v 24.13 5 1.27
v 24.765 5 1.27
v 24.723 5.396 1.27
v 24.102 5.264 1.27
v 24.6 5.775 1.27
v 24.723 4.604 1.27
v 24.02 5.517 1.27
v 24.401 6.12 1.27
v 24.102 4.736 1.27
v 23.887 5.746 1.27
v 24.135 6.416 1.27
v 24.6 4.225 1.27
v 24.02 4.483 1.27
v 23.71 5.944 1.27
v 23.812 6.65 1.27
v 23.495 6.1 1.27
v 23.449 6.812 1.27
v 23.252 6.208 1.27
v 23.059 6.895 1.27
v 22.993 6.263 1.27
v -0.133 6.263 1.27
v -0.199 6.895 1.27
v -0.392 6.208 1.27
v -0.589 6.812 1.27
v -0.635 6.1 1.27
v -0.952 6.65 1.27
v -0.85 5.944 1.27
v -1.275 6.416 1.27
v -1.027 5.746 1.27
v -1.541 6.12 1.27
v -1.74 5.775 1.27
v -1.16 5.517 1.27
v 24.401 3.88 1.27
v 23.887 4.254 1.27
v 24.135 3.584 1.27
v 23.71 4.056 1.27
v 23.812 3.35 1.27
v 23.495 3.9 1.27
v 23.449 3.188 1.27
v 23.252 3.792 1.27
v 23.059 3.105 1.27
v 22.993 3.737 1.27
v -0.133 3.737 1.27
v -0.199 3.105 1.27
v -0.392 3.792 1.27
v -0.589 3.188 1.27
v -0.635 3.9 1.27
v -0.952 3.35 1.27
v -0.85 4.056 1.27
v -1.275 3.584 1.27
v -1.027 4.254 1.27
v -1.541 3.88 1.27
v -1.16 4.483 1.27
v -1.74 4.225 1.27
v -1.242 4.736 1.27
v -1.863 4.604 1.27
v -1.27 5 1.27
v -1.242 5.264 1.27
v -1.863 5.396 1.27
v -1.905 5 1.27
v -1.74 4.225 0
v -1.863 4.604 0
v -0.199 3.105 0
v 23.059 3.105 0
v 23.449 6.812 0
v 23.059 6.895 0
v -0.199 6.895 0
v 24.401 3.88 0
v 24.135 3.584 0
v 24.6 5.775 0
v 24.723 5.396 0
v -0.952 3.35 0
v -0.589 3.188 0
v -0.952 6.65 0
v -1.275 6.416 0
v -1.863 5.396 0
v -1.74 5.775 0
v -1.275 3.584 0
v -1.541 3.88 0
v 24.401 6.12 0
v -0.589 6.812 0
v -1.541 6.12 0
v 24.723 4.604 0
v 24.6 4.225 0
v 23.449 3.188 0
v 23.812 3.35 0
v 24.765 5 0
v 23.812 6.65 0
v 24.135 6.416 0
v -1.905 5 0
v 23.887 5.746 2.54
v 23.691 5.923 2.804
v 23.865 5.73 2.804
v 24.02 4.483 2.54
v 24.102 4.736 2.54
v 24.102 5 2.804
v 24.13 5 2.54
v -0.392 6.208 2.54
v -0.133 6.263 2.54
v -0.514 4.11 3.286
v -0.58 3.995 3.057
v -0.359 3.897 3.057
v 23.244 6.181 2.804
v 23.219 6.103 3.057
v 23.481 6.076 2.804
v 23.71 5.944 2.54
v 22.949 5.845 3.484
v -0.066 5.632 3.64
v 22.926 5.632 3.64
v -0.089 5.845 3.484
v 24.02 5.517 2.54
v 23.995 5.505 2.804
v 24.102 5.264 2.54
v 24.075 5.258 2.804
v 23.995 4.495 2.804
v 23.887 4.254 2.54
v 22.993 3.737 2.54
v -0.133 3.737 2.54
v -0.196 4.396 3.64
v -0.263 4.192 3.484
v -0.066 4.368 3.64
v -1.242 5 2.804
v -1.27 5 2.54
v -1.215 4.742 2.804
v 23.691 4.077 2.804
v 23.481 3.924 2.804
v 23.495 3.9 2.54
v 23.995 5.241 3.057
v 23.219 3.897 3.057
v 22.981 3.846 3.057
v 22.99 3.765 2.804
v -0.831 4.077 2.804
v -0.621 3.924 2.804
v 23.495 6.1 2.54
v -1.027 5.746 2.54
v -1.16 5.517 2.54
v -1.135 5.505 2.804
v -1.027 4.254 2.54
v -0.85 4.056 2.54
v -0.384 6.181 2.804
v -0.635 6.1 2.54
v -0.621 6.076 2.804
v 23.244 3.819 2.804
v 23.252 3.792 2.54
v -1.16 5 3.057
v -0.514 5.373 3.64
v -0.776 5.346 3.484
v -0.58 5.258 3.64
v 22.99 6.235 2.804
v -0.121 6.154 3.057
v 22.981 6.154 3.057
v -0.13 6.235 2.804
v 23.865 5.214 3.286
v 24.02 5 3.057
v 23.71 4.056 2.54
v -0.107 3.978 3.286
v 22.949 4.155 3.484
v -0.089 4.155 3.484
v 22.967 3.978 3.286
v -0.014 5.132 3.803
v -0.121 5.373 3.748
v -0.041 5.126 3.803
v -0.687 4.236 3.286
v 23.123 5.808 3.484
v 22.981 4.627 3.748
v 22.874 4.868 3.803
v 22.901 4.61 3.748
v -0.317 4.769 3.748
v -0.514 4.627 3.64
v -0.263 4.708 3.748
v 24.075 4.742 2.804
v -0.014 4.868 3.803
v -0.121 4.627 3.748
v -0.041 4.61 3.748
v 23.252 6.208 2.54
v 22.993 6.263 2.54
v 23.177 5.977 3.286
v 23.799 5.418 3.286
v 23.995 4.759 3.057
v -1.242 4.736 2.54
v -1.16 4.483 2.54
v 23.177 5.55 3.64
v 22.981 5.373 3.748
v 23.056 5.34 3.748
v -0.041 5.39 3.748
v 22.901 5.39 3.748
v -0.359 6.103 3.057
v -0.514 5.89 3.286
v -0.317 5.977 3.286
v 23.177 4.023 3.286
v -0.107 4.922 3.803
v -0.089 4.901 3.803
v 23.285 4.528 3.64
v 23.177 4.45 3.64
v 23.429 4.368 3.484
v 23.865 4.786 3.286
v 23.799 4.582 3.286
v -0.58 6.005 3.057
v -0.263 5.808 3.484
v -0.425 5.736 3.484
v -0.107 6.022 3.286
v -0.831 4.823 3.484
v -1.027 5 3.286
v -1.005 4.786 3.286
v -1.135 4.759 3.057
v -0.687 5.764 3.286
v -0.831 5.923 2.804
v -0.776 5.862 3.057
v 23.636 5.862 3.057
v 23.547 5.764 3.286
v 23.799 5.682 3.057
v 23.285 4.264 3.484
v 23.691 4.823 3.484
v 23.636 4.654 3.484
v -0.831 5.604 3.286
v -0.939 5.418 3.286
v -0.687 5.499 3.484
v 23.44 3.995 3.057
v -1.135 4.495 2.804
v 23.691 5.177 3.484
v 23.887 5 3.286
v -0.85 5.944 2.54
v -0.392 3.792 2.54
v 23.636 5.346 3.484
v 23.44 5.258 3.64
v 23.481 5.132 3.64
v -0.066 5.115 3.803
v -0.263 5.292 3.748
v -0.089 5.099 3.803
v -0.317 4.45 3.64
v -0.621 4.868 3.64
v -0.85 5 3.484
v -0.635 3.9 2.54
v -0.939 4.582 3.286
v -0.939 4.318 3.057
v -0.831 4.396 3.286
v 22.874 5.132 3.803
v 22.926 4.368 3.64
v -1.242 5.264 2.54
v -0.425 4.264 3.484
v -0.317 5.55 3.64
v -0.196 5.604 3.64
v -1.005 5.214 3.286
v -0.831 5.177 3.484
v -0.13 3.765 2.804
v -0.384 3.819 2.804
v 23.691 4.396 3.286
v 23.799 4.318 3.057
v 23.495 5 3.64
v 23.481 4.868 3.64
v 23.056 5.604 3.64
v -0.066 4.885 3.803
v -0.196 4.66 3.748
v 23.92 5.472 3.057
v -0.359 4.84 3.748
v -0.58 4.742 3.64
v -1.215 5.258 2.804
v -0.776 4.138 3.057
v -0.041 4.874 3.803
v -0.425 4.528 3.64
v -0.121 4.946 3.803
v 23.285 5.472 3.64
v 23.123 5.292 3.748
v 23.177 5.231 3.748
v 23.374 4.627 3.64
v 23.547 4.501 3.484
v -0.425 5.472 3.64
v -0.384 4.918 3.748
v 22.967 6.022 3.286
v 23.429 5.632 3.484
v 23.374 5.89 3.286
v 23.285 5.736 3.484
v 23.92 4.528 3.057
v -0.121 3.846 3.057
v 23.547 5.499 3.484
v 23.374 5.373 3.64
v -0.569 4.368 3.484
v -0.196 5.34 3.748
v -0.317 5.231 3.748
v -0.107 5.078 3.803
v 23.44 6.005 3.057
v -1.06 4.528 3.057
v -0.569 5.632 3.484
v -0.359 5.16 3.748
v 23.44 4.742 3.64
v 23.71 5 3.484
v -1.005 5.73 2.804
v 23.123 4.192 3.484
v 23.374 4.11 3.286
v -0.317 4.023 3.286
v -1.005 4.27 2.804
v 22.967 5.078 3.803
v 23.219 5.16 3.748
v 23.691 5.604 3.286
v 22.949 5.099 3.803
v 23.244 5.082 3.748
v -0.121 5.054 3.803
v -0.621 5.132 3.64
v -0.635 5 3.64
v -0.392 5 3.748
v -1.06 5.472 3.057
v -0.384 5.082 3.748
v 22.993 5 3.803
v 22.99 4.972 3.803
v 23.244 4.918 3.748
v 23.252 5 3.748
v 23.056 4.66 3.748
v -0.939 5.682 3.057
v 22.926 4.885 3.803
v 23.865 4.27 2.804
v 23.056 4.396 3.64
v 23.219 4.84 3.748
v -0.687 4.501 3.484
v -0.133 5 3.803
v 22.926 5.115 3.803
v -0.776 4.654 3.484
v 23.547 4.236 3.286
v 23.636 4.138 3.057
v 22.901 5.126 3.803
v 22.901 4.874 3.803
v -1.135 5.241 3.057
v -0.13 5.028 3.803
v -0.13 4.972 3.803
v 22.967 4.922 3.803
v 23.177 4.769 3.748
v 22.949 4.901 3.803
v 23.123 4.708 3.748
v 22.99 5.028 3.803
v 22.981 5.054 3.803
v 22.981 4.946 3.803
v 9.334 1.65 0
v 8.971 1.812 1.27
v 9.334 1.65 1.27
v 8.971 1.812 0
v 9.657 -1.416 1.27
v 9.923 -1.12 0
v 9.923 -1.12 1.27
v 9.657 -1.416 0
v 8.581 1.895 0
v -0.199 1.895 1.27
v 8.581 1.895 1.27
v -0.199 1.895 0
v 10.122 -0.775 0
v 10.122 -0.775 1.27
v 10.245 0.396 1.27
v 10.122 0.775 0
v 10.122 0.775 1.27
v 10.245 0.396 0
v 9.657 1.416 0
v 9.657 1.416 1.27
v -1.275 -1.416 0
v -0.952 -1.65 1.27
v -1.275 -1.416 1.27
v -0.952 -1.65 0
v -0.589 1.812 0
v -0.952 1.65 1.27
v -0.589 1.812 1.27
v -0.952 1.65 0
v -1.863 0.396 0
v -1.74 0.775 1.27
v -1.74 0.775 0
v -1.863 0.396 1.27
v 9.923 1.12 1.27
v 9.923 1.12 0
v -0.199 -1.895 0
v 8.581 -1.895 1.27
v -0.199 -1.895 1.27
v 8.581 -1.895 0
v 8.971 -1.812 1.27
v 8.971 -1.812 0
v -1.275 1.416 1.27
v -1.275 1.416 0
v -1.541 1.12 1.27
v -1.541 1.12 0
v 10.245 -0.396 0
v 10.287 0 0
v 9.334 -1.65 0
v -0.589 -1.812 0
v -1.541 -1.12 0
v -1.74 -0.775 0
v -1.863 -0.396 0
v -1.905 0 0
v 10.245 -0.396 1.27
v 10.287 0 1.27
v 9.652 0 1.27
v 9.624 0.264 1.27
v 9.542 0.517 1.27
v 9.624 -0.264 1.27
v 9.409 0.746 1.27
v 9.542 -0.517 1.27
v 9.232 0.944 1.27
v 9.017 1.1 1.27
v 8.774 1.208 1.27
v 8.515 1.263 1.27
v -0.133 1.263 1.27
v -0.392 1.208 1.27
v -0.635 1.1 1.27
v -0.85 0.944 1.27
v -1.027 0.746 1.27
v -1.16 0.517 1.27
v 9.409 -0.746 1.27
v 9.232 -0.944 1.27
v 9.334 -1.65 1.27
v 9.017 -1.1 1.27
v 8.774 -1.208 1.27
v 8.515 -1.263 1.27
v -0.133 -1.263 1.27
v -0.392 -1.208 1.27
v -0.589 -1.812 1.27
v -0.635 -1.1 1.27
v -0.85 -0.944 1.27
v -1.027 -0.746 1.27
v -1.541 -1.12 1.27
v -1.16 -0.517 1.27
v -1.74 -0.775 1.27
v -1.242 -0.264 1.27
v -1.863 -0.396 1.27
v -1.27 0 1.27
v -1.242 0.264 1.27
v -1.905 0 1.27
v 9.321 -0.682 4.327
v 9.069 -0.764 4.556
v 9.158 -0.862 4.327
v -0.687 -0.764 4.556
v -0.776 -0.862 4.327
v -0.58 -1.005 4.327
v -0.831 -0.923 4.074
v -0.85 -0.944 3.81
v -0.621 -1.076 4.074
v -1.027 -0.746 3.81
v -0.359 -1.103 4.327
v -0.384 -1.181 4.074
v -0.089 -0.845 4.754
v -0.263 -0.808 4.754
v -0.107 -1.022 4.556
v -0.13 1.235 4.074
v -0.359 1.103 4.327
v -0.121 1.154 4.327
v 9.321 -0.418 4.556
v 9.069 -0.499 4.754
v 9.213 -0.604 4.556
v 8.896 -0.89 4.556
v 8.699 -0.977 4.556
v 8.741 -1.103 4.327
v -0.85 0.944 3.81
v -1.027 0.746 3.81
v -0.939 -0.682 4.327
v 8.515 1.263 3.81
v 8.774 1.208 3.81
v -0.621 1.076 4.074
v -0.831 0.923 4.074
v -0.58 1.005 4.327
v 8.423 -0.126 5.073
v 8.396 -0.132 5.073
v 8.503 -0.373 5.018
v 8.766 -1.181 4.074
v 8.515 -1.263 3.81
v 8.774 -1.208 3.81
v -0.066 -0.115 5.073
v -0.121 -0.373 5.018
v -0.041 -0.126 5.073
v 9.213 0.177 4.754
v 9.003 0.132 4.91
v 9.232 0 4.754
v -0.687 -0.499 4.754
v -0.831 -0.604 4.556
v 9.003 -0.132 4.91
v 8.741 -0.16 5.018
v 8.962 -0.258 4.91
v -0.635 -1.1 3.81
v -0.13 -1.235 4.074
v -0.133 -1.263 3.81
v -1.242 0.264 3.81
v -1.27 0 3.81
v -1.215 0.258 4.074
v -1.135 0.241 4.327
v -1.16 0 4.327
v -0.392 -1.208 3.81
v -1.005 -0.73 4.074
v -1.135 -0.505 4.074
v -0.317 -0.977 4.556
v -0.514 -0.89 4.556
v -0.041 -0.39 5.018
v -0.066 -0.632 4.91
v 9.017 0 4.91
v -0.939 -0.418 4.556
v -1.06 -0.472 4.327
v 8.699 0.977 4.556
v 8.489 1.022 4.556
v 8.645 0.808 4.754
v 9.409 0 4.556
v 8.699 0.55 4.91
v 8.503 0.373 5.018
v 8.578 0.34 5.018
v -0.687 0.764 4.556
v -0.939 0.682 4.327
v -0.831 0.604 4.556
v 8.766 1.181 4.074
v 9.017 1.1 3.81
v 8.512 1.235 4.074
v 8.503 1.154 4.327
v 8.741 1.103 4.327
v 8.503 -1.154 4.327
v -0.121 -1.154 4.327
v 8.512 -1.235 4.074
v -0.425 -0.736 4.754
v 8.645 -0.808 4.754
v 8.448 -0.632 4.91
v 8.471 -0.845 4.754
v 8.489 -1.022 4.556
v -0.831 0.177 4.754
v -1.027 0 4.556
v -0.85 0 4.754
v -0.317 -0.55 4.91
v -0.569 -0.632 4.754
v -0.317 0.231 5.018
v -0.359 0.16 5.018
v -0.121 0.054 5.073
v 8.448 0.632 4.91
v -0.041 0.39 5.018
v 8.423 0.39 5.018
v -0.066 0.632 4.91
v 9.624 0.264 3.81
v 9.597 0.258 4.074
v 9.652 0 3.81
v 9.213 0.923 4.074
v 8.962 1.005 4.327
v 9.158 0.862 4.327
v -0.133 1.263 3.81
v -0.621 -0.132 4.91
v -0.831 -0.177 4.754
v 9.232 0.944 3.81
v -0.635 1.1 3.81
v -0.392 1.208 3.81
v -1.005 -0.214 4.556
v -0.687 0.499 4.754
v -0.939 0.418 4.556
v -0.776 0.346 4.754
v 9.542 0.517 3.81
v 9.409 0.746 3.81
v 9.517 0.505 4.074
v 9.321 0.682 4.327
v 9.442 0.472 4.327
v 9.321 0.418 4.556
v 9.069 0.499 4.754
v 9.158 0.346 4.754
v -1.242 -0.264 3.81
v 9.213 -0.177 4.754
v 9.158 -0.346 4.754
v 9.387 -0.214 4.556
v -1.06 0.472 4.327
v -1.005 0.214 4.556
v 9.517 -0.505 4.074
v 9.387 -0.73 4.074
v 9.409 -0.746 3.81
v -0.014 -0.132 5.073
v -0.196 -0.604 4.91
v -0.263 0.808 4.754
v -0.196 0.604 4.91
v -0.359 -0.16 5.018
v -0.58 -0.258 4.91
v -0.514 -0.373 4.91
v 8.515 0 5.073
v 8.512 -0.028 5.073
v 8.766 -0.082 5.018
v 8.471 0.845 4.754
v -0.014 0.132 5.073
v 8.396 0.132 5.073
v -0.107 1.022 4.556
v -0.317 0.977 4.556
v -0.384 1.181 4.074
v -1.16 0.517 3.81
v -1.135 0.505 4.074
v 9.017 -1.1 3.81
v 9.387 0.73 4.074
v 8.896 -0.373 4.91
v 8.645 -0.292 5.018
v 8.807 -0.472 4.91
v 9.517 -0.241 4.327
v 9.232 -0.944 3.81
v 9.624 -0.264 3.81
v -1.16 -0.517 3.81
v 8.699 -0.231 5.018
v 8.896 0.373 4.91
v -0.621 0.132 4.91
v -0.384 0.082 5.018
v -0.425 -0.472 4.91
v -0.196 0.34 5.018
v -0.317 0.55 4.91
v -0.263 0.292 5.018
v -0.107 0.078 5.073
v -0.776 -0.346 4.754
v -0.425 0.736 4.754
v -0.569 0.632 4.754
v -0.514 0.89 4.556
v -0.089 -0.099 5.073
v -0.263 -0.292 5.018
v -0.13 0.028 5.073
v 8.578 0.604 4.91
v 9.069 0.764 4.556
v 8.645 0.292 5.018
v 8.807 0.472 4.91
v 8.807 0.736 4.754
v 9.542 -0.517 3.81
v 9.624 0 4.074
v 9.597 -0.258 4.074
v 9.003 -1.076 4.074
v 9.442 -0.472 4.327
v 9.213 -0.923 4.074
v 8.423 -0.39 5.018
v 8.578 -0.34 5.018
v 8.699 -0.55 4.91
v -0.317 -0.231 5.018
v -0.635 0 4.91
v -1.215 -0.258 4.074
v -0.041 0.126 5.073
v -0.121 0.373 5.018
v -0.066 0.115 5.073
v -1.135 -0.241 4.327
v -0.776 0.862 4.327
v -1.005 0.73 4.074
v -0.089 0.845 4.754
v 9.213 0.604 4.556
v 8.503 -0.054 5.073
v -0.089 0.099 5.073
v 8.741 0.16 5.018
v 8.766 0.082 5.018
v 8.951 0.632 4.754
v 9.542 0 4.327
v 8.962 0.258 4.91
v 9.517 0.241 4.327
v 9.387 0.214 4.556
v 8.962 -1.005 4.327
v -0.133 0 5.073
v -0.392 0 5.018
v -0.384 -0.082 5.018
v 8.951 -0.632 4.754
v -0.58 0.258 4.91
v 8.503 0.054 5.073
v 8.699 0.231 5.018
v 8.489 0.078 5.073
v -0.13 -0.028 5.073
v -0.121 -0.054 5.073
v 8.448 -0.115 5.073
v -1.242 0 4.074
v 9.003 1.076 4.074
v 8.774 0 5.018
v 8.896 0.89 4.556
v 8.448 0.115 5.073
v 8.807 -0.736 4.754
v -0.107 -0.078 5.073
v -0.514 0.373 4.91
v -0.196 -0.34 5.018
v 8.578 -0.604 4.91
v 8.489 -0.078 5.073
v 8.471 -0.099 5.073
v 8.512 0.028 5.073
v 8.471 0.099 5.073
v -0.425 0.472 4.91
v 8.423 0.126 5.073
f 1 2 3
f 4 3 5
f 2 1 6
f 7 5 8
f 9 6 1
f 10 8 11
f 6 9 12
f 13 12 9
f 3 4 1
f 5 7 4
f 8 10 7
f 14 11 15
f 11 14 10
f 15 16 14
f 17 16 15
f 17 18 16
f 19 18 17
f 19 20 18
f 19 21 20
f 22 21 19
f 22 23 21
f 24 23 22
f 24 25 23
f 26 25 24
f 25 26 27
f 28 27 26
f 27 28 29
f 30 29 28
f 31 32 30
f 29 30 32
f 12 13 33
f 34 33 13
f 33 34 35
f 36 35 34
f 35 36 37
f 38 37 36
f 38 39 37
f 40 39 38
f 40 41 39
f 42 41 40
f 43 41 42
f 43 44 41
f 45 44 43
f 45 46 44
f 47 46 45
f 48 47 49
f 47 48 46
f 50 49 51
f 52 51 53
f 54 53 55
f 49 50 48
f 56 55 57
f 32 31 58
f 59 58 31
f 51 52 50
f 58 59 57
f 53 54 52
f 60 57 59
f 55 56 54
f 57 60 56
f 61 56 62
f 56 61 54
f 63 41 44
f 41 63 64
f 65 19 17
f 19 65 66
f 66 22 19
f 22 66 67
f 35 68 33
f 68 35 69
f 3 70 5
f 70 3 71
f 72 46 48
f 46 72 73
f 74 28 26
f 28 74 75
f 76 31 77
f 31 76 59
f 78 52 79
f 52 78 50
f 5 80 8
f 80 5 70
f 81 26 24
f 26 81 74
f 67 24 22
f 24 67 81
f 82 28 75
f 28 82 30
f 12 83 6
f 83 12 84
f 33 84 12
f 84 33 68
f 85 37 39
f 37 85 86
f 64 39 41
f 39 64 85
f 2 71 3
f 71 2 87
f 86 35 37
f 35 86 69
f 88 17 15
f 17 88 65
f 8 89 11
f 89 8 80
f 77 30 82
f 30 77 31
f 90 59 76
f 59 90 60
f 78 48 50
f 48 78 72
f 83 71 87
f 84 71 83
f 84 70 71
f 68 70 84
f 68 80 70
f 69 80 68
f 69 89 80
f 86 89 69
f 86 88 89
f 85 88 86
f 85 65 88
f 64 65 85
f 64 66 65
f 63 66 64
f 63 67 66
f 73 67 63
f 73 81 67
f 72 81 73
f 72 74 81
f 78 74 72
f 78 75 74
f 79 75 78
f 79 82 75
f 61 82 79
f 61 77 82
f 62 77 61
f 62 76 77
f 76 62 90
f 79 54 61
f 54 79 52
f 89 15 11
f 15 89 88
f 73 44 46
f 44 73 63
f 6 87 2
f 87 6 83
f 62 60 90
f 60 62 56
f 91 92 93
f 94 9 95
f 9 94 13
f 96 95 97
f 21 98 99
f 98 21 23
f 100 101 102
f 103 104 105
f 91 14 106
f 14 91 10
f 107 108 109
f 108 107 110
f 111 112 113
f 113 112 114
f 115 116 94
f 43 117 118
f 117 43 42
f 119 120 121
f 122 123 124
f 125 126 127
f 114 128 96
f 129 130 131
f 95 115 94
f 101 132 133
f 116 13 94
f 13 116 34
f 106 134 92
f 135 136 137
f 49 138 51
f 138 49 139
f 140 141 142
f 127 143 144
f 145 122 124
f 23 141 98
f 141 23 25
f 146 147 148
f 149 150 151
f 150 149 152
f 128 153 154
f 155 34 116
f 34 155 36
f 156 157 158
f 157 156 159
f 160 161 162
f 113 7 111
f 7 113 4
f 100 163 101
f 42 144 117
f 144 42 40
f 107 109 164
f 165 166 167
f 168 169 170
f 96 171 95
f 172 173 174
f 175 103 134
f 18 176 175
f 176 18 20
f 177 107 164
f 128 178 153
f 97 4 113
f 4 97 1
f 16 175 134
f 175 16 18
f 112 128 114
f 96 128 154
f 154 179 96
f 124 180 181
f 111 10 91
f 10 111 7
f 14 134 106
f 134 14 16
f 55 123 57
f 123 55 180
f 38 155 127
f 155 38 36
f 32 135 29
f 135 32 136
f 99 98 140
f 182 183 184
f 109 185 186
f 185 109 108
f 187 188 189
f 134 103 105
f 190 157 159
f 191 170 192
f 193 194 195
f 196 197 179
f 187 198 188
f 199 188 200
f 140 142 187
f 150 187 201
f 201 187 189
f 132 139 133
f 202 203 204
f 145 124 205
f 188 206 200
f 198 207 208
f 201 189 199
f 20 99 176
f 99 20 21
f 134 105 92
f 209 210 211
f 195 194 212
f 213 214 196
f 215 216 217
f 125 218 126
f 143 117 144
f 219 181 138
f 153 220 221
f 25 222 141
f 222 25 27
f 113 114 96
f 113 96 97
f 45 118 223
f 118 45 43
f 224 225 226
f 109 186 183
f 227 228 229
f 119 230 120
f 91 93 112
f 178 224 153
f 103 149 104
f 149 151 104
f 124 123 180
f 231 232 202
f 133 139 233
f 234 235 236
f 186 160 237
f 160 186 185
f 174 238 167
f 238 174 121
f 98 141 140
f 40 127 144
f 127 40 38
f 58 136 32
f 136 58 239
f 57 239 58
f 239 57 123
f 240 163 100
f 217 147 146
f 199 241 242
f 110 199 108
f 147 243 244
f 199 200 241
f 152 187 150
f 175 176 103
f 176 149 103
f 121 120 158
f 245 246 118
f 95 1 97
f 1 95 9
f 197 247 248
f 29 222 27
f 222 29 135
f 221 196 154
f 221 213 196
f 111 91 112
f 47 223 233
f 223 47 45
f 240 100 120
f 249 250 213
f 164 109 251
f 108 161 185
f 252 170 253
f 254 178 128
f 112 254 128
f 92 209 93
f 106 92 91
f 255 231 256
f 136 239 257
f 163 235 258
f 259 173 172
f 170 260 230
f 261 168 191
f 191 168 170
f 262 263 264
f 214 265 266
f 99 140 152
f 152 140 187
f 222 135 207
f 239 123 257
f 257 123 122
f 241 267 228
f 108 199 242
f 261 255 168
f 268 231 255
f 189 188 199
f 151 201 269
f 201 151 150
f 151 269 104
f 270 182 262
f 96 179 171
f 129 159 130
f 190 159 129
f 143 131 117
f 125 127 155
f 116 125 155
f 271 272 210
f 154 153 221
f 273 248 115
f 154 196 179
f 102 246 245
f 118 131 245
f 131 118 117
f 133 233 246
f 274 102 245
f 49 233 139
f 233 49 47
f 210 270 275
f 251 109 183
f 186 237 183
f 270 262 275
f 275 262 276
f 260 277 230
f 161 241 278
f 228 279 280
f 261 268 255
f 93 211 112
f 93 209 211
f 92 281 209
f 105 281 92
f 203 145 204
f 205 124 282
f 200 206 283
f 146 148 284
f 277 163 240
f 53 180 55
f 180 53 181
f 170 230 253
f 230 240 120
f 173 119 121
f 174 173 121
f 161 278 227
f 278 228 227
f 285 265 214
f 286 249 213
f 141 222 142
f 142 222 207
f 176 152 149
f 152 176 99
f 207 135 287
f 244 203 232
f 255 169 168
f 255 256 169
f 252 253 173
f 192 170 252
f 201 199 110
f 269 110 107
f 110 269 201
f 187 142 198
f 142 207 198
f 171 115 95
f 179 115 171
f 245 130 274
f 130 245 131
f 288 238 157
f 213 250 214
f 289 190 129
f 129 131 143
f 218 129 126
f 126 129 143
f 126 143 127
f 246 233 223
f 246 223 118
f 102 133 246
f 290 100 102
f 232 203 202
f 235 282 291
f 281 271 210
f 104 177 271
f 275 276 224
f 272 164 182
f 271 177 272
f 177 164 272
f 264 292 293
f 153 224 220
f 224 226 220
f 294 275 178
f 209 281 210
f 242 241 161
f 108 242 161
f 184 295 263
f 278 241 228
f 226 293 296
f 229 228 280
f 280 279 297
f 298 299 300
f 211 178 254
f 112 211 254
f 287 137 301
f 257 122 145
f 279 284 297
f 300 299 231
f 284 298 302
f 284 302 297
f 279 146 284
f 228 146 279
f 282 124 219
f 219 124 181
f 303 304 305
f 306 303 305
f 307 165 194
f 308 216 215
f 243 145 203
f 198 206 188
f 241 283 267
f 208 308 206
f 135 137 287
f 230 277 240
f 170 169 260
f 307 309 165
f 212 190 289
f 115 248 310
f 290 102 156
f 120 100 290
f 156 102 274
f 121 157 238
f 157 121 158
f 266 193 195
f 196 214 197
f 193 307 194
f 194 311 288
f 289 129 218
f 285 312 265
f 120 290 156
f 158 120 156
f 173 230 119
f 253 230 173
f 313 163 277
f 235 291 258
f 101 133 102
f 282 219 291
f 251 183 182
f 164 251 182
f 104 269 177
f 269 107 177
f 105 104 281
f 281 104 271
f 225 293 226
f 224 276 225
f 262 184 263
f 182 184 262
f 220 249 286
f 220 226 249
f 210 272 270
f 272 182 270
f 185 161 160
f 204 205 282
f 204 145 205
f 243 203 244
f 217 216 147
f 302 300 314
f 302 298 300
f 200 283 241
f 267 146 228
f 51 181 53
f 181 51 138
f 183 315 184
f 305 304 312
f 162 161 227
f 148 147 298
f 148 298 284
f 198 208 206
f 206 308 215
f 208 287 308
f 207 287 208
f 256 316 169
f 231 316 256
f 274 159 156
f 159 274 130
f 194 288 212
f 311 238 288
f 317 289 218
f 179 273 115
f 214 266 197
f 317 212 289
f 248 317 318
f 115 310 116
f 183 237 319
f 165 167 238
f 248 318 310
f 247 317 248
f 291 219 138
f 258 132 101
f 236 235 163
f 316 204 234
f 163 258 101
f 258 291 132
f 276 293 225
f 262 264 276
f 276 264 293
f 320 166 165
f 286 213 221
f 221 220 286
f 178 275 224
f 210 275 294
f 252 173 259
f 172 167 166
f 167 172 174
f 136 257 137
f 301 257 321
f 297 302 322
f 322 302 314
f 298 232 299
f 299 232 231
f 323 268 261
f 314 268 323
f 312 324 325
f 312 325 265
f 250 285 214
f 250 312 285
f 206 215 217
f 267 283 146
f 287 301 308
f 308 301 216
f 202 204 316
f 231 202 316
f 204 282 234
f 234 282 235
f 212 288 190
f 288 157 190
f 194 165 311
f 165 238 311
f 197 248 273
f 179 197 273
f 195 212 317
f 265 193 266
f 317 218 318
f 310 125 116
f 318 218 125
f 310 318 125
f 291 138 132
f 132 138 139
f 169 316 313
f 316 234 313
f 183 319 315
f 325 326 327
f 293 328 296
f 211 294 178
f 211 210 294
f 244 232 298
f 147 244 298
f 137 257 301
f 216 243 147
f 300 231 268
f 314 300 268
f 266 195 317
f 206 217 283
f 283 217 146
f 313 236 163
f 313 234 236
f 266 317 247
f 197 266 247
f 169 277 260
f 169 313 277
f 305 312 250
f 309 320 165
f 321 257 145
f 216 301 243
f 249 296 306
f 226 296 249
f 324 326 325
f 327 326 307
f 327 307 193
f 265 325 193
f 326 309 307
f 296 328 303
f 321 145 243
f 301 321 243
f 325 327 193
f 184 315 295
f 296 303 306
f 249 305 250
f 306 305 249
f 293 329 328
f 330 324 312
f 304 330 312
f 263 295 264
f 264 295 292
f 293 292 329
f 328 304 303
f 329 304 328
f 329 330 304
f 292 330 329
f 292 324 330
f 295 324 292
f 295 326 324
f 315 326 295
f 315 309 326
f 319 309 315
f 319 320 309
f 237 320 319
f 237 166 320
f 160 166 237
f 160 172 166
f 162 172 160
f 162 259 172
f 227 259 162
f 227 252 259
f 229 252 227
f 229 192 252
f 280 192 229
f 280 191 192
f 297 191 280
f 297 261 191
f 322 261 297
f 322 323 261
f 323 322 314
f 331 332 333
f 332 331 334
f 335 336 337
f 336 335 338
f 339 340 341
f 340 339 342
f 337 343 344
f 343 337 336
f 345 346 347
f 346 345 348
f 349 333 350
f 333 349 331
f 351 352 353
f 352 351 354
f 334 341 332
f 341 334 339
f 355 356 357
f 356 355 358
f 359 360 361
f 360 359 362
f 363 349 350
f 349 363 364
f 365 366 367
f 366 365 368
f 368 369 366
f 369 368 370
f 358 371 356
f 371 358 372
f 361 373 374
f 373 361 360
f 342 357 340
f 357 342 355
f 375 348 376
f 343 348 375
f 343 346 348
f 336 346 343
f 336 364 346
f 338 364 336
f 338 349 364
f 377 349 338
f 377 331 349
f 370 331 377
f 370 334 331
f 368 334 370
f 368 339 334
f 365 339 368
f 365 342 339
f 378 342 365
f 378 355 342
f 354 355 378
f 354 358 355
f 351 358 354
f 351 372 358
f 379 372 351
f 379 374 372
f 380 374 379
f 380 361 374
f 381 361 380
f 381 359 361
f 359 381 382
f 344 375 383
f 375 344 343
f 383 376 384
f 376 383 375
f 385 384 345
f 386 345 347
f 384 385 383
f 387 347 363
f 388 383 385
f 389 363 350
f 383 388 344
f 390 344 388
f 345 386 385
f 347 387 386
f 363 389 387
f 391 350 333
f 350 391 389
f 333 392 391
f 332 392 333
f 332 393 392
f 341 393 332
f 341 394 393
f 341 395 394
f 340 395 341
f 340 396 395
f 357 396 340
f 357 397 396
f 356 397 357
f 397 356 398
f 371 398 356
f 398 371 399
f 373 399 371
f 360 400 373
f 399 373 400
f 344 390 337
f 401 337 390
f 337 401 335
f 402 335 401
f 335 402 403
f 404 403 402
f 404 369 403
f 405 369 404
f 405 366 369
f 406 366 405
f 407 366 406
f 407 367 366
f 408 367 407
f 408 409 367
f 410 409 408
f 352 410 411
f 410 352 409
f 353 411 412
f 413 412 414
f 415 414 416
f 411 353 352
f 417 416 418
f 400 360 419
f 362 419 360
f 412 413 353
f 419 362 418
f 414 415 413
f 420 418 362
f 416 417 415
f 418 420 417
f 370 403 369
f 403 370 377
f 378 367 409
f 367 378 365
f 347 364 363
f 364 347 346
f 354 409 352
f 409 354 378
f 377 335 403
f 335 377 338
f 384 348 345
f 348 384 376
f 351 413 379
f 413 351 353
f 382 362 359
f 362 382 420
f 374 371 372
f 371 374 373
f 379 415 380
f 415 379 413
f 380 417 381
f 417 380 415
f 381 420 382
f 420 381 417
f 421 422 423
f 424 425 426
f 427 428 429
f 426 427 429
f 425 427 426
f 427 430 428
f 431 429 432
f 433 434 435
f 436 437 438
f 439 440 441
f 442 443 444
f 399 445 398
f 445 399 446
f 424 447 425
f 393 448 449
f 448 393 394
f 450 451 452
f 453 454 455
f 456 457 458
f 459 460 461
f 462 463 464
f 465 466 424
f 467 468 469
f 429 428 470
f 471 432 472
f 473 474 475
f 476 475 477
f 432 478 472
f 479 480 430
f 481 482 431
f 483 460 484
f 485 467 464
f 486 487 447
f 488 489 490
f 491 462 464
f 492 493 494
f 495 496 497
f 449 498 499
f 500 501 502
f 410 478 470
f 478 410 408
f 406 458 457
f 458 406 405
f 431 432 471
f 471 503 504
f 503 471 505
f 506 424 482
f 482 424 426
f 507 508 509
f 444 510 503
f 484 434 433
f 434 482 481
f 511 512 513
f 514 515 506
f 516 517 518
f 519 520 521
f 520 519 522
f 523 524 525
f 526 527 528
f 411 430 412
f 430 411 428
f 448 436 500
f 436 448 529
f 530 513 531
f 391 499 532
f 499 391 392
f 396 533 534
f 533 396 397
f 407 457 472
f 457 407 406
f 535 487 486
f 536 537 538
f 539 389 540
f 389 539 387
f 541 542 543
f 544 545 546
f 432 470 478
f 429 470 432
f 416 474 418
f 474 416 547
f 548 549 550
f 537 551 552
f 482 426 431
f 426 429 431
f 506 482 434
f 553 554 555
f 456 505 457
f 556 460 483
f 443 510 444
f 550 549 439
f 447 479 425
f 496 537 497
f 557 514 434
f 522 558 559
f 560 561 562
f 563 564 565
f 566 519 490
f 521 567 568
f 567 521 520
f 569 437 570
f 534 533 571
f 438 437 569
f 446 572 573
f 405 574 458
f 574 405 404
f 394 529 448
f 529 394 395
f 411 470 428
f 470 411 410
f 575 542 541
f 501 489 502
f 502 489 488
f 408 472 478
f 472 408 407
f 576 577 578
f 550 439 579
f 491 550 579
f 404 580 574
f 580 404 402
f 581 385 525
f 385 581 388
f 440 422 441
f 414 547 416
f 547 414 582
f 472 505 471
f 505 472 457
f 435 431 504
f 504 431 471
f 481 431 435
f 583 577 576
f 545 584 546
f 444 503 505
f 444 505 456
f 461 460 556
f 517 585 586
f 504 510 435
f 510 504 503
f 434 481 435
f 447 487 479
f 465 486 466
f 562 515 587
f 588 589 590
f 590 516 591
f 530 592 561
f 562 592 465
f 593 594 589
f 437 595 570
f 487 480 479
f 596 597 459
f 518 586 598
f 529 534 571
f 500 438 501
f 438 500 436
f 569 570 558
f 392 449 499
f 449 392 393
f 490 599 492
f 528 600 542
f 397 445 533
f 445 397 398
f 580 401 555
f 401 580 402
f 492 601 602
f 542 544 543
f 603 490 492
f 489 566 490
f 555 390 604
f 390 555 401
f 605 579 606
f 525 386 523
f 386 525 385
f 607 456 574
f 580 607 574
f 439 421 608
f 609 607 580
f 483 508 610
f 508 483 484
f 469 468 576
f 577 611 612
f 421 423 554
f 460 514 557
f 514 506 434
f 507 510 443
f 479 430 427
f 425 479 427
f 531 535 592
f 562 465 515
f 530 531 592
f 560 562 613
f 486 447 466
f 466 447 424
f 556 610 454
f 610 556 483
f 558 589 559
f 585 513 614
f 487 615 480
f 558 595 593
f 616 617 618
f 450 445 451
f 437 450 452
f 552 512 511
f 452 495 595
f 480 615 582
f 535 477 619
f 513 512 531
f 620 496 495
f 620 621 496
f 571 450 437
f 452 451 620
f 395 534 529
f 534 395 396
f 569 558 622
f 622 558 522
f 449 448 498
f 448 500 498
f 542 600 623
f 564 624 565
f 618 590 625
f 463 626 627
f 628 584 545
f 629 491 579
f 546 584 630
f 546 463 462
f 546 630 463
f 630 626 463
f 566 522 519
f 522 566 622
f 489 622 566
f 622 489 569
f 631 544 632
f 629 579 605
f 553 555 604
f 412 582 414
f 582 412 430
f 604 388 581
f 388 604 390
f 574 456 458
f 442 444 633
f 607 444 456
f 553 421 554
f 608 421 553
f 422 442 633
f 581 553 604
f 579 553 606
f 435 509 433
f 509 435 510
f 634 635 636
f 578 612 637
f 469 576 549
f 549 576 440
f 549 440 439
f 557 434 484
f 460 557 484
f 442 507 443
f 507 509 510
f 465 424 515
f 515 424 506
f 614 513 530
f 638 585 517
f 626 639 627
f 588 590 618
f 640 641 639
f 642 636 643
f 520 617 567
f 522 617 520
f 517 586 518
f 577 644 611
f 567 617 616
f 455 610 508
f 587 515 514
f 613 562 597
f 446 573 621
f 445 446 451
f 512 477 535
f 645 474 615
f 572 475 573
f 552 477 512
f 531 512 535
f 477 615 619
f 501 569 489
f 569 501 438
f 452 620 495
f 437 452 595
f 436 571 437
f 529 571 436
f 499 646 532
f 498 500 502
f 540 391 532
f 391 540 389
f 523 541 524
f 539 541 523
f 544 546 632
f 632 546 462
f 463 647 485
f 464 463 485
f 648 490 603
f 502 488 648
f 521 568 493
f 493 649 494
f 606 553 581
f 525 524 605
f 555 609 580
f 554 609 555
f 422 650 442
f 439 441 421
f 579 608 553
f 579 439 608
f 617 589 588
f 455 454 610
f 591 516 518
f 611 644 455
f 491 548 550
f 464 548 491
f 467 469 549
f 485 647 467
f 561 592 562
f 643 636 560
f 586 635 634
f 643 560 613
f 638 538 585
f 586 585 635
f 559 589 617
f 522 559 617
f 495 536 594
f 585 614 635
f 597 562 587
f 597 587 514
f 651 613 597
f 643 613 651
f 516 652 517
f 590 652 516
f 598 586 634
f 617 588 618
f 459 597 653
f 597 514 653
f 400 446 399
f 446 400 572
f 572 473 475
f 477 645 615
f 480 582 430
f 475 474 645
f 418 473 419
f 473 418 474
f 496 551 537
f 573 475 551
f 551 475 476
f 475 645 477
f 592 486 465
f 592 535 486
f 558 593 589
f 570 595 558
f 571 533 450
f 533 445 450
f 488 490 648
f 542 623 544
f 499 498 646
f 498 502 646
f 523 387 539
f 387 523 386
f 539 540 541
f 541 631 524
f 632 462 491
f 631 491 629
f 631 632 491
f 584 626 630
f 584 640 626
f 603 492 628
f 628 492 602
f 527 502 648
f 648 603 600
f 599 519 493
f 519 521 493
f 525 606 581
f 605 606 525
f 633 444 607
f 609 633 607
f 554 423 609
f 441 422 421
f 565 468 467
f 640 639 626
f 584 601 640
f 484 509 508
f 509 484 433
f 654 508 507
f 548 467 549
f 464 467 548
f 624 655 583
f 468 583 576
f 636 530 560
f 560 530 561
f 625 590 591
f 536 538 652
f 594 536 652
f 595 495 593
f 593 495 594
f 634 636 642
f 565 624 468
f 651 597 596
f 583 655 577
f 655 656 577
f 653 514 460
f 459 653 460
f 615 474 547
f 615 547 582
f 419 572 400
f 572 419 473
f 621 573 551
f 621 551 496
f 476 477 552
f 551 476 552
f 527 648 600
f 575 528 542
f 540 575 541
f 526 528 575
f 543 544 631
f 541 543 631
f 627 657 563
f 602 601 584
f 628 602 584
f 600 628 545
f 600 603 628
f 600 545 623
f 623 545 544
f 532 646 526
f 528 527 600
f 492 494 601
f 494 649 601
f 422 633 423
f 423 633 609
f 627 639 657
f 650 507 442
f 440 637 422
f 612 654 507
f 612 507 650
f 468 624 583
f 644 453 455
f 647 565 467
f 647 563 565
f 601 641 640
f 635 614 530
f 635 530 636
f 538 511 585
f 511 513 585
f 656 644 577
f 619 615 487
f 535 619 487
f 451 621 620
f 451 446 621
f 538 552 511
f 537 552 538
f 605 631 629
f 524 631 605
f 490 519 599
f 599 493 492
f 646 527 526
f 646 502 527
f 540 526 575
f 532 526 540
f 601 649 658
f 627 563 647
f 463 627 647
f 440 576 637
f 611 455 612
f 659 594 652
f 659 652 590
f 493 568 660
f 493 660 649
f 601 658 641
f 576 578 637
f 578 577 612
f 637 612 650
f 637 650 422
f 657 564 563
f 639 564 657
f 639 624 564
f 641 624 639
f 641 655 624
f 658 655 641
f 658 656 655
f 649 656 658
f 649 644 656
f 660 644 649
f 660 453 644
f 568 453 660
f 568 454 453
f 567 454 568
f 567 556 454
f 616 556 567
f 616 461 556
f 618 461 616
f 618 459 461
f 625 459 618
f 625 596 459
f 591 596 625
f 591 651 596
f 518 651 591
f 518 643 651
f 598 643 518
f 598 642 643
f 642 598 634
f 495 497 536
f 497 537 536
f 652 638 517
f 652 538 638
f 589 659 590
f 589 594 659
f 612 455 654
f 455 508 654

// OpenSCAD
//  1 inch = 25.4 millimeters
in2mm = 25.4;

translate([0, 5, 0]) union()
{
hull()
{
	cylinder(h = 0.05 * in2mm, r=(0.15*in2mm) * .5, $fs = .1);
	translate([(1.05 - 0.15) * in2mm, 0 , 0]) cylinder(h = 0.05 * in2mm, r=(0.15*in2mm) * .5, $fs = .1);
}

hull()
{
	cylinder(h = 0.05 * in2mm, r=(0.1*in2mm) * .5, $fs = .1);
	translate([(1.05  - 0.15) * in2mm, 0 , 0]) cylinder(h = 0.05 * in2mm, r=(0.1*in2mm) * .5, $fs = .1);

	translate([(.1 - 0.1 )  * in2mm, 0 , (0.05 + 0.15- .1 )* in2mm]) sphere(r=(0.1*in2mm) * .5, $fs = .1);
	translate([(1.05  - 0.15) * in2mm, 0 , (0.05 + 0.15- .1 )* in2mm]) sphere(r=(0.1*in2mm) * .5, $fs = .1);
}

}

union()
{
hull()
{
	cylinder(h = 0.05 * in2mm, r=(0.15*in2mm) * .5, $fs = .1);
	translate([(0.48 - 0.15) * in2mm, 0 , 0]) cylinder(h = 0.05 * in2mm, r=(0.15*in2mm) * .5, $fs = .1);
}

hull()
{
	cylinder(h = 0.05 * in2mm, r=(0.1*in2mm) * .5, $fs = .1);
	translate([(0.48 - 0.15) * in2mm, 0 , 0]) cylinder(h = 0.05 * in2mm, r=(0.1*in2mm) * .5, $fs = .1);

	translate([(.1 - 0.1 )  * in2mm, 0 , (0.1 + 0.15- .1 )* in2mm]) sphere(r=(0.1*in2mm) * .5, $fs = .1);
	translate([(0.48 - 0.15) * in2mm, 0 , (0.1 + 0.15- .1 )* in2mm]) sphere(r=(0.1*in2mm) * .5, $fs = .1);
}

}
